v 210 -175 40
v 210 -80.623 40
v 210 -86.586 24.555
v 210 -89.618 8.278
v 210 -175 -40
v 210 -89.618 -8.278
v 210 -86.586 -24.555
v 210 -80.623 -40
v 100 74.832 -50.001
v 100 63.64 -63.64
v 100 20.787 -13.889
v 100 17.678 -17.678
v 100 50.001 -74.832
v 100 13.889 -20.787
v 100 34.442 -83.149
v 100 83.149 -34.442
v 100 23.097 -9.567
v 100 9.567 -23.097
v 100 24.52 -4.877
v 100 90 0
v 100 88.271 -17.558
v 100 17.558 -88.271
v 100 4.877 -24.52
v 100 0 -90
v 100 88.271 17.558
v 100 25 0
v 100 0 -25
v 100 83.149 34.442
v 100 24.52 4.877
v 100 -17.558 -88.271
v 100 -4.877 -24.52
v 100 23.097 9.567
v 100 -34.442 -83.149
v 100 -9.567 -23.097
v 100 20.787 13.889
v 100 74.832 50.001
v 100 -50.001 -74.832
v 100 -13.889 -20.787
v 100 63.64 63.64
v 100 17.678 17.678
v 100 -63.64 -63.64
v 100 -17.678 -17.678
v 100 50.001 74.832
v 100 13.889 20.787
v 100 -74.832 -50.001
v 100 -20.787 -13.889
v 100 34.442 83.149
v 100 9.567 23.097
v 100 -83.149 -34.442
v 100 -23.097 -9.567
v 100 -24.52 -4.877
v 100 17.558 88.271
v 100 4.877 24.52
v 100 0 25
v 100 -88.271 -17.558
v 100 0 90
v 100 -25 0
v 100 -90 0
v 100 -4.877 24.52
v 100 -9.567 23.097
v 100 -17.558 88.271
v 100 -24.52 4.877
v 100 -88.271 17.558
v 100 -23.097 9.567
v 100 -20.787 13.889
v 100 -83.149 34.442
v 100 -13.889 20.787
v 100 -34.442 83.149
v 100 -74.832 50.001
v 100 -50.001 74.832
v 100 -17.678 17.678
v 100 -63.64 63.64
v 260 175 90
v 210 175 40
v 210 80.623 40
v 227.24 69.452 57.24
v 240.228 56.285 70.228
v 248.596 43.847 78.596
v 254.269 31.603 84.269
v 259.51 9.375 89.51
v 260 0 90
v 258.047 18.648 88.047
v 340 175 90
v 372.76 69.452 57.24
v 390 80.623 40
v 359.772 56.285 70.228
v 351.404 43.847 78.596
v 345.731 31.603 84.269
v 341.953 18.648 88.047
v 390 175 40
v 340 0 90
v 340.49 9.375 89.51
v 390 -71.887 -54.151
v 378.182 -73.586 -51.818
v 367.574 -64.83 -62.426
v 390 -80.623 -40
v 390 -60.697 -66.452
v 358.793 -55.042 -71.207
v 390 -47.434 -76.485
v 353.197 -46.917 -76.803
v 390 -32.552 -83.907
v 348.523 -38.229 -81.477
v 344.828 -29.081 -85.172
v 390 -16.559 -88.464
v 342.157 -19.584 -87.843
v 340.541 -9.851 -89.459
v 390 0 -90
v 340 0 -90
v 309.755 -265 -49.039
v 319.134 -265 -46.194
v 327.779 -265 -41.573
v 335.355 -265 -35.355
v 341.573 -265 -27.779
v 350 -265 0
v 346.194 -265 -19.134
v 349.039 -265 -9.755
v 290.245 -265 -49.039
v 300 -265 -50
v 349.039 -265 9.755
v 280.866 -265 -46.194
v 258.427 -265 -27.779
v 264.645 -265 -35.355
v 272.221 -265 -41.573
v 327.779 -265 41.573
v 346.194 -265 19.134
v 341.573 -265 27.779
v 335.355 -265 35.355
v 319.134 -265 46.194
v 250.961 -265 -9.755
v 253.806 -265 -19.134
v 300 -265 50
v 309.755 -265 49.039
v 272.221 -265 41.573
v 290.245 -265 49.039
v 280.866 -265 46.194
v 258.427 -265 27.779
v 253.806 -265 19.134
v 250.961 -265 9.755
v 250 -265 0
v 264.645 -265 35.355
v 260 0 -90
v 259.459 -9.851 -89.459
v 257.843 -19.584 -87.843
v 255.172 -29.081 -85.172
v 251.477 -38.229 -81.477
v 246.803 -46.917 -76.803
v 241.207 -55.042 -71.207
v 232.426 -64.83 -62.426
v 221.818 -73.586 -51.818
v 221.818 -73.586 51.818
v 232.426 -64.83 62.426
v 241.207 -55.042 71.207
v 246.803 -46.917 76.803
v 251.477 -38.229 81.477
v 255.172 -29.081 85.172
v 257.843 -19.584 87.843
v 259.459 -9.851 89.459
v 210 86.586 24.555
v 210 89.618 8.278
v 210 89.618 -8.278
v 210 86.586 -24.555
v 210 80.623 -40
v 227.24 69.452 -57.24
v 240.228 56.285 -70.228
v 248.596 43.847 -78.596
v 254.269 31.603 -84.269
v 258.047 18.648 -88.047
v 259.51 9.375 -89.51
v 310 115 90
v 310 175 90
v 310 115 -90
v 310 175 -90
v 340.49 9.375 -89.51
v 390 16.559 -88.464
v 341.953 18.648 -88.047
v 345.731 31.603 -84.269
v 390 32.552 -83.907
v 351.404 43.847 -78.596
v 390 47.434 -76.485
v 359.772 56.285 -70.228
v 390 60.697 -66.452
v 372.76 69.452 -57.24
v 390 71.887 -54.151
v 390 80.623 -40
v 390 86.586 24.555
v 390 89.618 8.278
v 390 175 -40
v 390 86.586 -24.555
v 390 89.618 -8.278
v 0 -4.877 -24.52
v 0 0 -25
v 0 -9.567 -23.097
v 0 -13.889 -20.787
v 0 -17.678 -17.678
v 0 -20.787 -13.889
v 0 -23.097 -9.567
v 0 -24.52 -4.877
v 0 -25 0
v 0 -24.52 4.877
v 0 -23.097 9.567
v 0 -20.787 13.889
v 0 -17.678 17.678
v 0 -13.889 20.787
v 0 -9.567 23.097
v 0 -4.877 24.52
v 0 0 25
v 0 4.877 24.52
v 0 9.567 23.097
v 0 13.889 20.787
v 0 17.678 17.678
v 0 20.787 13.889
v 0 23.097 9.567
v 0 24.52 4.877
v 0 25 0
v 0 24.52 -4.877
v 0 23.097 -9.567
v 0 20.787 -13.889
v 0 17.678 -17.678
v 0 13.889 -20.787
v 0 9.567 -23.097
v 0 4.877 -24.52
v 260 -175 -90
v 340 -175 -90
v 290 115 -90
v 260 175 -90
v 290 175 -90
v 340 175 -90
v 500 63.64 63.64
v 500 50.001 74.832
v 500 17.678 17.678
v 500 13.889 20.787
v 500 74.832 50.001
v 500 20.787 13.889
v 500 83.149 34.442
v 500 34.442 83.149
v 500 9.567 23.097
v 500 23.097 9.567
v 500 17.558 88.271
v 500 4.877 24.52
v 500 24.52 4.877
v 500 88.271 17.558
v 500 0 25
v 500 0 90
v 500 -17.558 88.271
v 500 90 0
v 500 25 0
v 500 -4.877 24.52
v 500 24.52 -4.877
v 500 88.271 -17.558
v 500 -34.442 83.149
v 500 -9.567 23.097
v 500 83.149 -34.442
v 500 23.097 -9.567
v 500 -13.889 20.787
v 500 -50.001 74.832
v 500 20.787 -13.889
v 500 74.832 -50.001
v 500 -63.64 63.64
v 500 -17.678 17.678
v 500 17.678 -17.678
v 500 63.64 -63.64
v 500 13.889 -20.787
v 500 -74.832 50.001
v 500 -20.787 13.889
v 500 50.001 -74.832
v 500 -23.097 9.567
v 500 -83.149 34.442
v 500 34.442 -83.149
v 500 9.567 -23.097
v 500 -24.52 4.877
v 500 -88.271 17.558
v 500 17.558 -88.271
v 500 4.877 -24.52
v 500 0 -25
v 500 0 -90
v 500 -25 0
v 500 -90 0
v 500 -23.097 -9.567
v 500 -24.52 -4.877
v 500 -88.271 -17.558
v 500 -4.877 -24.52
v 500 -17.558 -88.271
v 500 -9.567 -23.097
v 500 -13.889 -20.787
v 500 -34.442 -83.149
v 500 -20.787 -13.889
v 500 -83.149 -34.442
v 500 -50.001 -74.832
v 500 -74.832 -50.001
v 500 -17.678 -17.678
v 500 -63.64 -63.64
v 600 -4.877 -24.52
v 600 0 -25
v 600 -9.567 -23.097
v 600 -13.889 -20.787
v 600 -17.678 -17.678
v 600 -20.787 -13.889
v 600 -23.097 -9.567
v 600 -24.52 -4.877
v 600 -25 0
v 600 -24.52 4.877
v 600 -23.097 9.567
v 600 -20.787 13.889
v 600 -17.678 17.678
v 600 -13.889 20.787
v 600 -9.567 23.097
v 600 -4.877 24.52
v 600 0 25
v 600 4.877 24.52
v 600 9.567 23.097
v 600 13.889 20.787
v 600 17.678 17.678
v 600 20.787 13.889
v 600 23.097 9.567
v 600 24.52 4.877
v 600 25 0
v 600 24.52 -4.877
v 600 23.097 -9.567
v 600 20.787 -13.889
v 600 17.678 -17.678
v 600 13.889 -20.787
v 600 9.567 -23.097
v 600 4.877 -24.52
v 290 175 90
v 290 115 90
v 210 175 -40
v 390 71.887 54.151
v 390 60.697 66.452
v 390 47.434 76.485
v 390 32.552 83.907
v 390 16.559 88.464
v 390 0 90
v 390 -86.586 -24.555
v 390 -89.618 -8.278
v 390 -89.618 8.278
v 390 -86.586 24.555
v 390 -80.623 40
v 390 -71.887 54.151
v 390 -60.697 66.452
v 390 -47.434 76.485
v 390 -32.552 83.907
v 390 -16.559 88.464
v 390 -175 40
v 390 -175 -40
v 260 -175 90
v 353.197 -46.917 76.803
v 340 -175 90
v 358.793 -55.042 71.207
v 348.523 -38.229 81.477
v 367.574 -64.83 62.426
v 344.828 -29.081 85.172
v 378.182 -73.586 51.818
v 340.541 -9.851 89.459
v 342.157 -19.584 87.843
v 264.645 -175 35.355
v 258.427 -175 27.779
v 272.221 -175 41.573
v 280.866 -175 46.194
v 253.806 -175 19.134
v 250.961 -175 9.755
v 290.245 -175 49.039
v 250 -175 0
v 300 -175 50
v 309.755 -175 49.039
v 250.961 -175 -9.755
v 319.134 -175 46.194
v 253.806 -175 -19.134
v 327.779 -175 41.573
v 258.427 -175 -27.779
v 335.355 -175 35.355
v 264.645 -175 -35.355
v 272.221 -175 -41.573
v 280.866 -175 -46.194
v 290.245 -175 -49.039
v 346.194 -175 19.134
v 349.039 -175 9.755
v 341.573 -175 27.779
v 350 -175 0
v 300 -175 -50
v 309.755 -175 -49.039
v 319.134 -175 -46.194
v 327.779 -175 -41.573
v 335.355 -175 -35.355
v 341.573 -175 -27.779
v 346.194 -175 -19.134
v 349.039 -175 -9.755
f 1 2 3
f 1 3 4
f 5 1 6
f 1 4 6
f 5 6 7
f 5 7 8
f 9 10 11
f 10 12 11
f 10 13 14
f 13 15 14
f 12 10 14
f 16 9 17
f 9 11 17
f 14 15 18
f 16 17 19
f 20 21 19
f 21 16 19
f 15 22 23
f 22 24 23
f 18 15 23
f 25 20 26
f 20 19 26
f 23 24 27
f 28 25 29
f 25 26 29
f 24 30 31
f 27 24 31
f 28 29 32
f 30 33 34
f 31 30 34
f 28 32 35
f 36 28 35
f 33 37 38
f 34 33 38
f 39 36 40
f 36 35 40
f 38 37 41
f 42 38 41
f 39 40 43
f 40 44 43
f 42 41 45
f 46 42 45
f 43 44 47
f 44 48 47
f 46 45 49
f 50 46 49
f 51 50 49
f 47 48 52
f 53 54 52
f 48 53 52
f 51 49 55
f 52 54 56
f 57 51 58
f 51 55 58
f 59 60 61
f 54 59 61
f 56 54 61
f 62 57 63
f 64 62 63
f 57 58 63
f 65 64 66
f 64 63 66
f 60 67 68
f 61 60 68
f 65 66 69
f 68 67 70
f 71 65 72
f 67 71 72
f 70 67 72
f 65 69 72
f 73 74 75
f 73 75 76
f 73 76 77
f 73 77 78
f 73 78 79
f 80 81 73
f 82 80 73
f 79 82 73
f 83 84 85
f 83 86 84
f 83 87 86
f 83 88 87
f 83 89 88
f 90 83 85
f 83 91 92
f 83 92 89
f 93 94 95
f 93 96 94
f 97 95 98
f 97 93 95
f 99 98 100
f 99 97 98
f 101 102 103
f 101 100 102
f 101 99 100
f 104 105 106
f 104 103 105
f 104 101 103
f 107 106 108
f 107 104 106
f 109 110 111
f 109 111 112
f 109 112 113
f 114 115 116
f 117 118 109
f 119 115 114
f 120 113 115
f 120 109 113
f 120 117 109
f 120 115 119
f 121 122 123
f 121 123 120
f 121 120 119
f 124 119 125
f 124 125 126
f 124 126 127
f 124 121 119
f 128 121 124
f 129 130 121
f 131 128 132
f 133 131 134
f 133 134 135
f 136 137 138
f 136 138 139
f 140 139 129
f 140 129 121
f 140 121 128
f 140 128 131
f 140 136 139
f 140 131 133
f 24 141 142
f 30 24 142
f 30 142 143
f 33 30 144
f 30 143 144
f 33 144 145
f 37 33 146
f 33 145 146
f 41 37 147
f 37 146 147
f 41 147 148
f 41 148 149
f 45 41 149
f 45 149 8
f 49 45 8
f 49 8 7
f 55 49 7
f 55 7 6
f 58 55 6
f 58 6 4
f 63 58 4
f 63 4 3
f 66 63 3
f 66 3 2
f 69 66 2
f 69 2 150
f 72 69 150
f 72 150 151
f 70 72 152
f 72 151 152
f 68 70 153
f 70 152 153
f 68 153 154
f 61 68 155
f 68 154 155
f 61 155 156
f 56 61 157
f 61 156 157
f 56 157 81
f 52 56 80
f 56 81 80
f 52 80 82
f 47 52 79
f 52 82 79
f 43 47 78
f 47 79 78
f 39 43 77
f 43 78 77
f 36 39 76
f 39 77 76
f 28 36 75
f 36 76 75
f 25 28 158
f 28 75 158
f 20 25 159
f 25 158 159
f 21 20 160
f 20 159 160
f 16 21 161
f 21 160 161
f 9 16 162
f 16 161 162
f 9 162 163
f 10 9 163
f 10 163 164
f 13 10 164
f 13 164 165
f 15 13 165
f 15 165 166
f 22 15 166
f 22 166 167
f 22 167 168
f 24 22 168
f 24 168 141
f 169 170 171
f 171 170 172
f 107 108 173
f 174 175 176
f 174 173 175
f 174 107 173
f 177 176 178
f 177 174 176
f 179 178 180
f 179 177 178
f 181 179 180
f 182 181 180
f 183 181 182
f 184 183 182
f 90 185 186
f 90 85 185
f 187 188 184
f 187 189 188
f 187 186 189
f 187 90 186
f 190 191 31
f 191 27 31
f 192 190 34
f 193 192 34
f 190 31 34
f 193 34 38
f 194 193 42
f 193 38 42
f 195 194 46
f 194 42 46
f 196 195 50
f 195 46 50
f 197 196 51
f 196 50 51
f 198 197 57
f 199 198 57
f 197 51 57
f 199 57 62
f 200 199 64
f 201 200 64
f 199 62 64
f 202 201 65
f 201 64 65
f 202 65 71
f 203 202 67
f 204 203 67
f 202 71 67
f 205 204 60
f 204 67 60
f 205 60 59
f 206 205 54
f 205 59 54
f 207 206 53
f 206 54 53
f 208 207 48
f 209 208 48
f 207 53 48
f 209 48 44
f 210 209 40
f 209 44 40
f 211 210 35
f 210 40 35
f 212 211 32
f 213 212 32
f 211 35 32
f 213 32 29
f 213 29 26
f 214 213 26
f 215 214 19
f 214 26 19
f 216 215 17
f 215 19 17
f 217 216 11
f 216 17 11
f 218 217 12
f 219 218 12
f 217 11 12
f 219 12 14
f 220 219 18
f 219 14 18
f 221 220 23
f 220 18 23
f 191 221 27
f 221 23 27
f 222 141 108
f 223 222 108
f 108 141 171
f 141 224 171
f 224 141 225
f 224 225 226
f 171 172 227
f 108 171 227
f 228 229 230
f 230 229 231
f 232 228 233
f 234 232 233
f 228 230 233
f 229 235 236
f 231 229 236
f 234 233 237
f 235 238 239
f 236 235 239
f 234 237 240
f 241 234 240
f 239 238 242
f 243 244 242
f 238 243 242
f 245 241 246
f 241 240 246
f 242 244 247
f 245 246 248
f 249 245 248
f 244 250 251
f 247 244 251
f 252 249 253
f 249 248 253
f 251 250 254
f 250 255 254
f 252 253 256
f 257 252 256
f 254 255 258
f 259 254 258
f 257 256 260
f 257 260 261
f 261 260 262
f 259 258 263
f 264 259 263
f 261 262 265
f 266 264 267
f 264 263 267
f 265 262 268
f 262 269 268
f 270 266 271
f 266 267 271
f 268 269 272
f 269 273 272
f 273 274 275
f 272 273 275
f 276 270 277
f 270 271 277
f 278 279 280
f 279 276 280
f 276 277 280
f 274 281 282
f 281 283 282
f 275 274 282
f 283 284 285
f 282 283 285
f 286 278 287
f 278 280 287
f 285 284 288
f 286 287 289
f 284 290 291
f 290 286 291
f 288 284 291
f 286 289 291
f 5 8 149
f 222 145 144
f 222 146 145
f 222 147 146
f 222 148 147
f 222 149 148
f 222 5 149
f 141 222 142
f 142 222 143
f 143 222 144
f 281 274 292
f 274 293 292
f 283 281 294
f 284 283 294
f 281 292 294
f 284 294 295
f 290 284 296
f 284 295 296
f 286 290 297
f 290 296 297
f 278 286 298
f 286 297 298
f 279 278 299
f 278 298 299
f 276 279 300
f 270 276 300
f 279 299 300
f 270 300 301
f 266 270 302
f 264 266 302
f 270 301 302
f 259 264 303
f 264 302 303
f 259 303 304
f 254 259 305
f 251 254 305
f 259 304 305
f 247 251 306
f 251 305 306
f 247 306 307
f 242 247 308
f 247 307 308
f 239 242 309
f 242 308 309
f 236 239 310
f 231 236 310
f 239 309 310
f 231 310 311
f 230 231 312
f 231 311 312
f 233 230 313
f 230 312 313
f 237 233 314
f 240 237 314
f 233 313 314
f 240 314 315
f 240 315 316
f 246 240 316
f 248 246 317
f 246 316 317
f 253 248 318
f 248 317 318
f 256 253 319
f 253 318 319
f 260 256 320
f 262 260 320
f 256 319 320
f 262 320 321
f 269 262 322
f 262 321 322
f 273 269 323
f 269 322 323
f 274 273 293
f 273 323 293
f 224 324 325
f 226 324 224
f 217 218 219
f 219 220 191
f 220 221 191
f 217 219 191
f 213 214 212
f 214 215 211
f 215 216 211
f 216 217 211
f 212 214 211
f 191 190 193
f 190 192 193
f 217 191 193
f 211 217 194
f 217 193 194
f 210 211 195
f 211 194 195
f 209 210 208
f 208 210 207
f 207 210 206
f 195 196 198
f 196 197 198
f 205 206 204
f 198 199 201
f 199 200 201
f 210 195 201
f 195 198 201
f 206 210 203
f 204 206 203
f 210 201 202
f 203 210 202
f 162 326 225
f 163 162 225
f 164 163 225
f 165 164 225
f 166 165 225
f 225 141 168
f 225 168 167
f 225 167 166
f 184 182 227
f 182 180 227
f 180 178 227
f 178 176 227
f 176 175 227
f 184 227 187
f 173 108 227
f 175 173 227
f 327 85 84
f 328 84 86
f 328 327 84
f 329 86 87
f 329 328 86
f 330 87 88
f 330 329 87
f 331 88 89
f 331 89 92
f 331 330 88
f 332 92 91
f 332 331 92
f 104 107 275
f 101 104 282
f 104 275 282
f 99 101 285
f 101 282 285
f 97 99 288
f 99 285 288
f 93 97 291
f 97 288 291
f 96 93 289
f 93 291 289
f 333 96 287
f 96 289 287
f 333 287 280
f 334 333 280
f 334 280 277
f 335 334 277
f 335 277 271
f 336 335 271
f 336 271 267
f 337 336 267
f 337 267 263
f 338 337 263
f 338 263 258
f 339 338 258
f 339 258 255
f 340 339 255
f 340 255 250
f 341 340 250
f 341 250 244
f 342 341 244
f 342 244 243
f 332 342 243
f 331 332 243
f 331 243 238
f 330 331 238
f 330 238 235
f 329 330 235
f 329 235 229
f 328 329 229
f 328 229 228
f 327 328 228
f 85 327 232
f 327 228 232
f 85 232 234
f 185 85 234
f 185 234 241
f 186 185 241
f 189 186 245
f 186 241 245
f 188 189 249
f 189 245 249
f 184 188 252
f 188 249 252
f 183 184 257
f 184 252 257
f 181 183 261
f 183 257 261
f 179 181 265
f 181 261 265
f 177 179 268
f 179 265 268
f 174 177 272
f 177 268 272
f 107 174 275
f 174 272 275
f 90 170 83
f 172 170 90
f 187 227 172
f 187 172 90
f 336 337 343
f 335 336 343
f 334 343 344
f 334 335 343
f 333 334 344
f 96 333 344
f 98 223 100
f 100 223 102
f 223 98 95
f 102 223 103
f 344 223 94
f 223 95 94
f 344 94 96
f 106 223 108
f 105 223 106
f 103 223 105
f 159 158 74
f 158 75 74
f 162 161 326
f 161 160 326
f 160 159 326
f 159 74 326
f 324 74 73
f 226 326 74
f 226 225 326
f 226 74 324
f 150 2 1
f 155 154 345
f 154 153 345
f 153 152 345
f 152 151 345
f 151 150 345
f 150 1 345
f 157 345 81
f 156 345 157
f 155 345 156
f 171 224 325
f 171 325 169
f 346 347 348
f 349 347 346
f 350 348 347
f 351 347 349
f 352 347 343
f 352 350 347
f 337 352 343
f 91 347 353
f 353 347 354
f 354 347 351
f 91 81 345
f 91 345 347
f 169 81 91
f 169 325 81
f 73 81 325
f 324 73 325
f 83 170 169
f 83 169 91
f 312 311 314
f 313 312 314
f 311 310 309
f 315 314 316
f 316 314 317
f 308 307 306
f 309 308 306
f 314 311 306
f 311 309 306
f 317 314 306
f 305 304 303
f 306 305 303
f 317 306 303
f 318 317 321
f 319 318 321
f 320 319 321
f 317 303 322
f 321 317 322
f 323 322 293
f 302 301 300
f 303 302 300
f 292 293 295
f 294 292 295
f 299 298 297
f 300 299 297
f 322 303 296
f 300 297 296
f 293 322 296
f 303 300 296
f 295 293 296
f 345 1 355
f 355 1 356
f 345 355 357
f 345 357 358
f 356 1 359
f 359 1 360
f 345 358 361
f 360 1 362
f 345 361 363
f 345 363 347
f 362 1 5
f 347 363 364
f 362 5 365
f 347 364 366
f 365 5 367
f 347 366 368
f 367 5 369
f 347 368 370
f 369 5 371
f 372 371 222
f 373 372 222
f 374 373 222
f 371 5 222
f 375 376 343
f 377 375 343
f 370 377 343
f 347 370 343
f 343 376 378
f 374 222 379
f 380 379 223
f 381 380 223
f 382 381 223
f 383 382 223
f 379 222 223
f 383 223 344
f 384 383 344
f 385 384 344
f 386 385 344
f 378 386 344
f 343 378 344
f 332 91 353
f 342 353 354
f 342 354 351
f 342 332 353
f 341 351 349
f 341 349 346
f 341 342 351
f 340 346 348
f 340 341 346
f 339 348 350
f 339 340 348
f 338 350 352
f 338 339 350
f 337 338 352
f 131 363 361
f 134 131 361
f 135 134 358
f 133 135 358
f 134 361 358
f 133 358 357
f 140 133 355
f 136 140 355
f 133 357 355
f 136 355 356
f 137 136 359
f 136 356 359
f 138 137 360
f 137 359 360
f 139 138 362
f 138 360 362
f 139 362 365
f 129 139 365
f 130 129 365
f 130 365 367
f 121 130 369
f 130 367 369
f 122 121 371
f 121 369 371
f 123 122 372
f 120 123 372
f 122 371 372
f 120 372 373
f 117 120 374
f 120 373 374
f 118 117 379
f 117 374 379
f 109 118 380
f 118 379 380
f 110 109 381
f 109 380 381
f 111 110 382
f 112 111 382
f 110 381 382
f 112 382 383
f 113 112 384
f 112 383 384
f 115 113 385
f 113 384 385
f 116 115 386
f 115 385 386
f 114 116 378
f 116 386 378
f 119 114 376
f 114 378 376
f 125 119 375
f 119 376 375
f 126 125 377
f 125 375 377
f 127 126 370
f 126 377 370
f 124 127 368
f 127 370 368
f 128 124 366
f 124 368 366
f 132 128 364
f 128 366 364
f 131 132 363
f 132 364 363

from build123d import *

# Parameters (mm, degrees)
SKETCH4_W           = 180
SKETCH4_H           = 180
BOSS_EXTRUDE2_DEPTH = 175
SKETCH5_R           = 50
BOSS_EXTRUDE3_DEPTH = 90
CHAMFER1_SIZE       = 50
SKETCH6_W           = 20
SKETCH6_H           = 180
CUT_EXTRUDE1_DEPTH  = 60


with BuildPart() as part:
    # Sketch3 → Revolve1 (revolve)
    with BuildSketch(Plane.XY, mode=Mode.PRIVATE) as revolve1_sk:
        Polygon((0, 0), (0, 25), (100, 25), (100, 90), (500, 90), (500, 25), (600, 25), (600, 0), align=None)
    revolve(revolve1_sk.sketch.rotate(Axis((0, 0, 0), (-1, 0, 0)), 90), axis=Axis((0, 0, 0), (-1, 0, 0)))

    # Sketch4 → Boss-Extrude2 (add, symmetric)
    with BuildSketch(Plane(origin=(0, 0, 0), x_dir=(1, 0, 0), z_dir=(0, 1, 0))):
        with Locations((300, 0)):
            Rectangle(SKETCH4_W, SKETCH4_H)
    extrude(amount=BOSS_EXTRUDE2_DEPTH, both=True)

    # Sketch5 → Boss-Extrude3 (add)
    with BuildSketch(Plane.XZ.offset(175)):
        with Locations(Location((300, 0, 0), (0, 0, 90))):
            Circle(SKETCH5_R)
    extrude(amount=BOSS_EXTRUDE3_DEPTH)

    # Chamfer1
    # the kernel refuses this chamfer: 50 mm, written as the material it takes off along each edge
    with BuildSketch(Plane(origin=(210, -303.584149398, -90), x_dir=(-0.027495876610586594, 0, 0.9996219169112966), z_dir=(0, 1, 0))) as chamfer1_piece_1_section:
        Polygon((CHAMFER1_SIZE * 0.999621916911, CHAMFER1_SIZE * 0.0274958766106), (-CHAMFER1_SIZE * 0.0274958766106, CHAMFER1_SIZE * 0.999621916911), (0, 0), align=None)
    chamfer1_piece_1 = extrude(amount=303.584149398, mode=Mode.PRIVATE)
    chamfer1_piece_1 = chamfer1_piece_1 - Plane(origin=(227.472268945, 0, 0), x_dir=(0, 0, -1), z_dir=(1, 0, 0)) * Cylinder(90, 808, mode=Mode.PRIVATE)
    add(chamfer1_piece_1, mode=Mode.SUBTRACT)
    with BuildSketch(Plane(origin=(210, -303.584149398, 90), x_dir=(-0.027495876610586598, 0, -0.9996219169112966), z_dir=(0, 1, 0))) as chamfer1_piece_2_section:
        Polygon((CHAMFER1_SIZE * 0.999621916911, -CHAMFER1_SIZE * 0.0274958766106), (-CHAMFER1_SIZE * 0.0274958766106, -CHAMFER1_SIZE * 0.999621916911), (0, 0), align=None)
    chamfer1_piece_2 = extrude(amount=303.584149398, mode=Mode.PRIVATE)
    chamfer1_piece_2 = chamfer1_piece_2 - Plane(origin=(227.472268938, 0, 0), x_dir=(0, 0, -1), z_dir=(1, 0, 0)) * Cylinder(90, 808, mode=Mode.PRIVATE)
    add(chamfer1_piece_2, mode=Mode.SUBTRACT)
    with BuildSketch(Plane(origin=(390, 0, 90), x_dir=(-0.9996219169112966, 0, 0.02749587661058631), z_dir=(0, -1, 0))) as chamfer1_piece_3_section:
        Polygon((CHAMFER1_SIZE * 0.999621916911, CHAMFER1_SIZE * 0.0274958766106), (-CHAMFER1_SIZE * 0.0274958766106, CHAMFER1_SIZE * 0.999621916911), (0, 0), align=None)
    chamfer1_piece_3 = extrude(amount=303.584149398, mode=Mode.PRIVATE)
    chamfer1_piece_3 = chamfer1_piece_3 - Plane(origin=(372.527731062, 0, 0), x_dir=(0, 0, -1), z_dir=(1, 0, 0)) * Cylinder(90, 808, mode=Mode.PRIVATE)
    add(chamfer1_piece_3, mode=Mode.SUBTRACT)
    with BuildSketch(Plane(origin=(390, 303.584149398, -90), x_dir=(-0.9996219169112966, 0, -0.02749587661058631), z_dir=(0, -1, 0))) as chamfer1_piece_4_section:
        Polygon((CHAMFER1_SIZE * 0.999621916911, -CHAMFER1_SIZE * 0.0274958766106), (-CHAMFER1_SIZE * 0.0274958766106, -CHAMFER1_SIZE * 0.999621916911), (0, 0), align=None)
    chamfer1_piece_4 = extrude(amount=303.584149398, mode=Mode.PRIVATE)
    chamfer1_piece_4 = chamfer1_piece_4 - Plane(origin=(372.527731055, 0, 0), x_dir=(0, 0, -1), z_dir=(1, 0, 0)) * Cylinder(90, 808, mode=Mode.PRIVATE)
    add(chamfer1_piece_4, mode=Mode.SUBTRACT)
    with BuildSketch(Plane(origin=(210, 0, -90), x_dir=(-0.027495876610586594, 0, 0.9996219169112966), z_dir=(0, 1, 0))) as chamfer1_piece_5_section:
        Polygon((CHAMFER1_SIZE * 0.999621916911, CHAMFER1_SIZE * 0.0274958766106), (-CHAMFER1_SIZE * 0.0274958766106, CHAMFER1_SIZE * 0.999621916911), (0, 0), align=None)
    chamfer1_piece_5 = extrude(amount=303.584149398, mode=Mode.PRIVATE)
    chamfer1_piece_5 = chamfer1_piece_5 - Plane(origin=(227.472268945, 0, 0), x_dir=(0, 0, -1), z_dir=(1, 0, 0)) * Cylinder(90, 808, mode=Mode.PRIVATE)
    add(chamfer1_piece_5, mode=Mode.SUBTRACT)
    with BuildSketch(Plane(origin=(210, 0, 90), x_dir=(-0.027495876610586598, 0, -0.9996219169112966), z_dir=(0, 1, 0))) as chamfer1_piece_6_section:
        Polygon((CHAMFER1_SIZE * 0.999621916911, -CHAMFER1_SIZE * 0.0274958766106), (-CHAMFER1_SIZE * 0.0274958766106, -CHAMFER1_SIZE * 0.999621916911), (0, 0), align=None)
    chamfer1_piece_6 = extrude(amount=303.584149398, mode=Mode.PRIVATE)
    chamfer1_piece_6 = chamfer1_piece_6 - Plane(origin=(227.472268947, 0, 0), x_dir=(0, 0, -1), z_dir=(1, 0, 0)) * Cylinder(90, 808, mode=Mode.PRIVATE)
    add(chamfer1_piece_6, mode=Mode.SUBTRACT)
    with BuildSketch(Plane(origin=(390, 303.584149398, 90), x_dir=(-0.9996219169112966, 0, 0.02749587661058631), z_dir=(0, -1, 0))) as chamfer1_piece_7_section:
        Polygon((CHAMFER1_SIZE * 0.999621916911, CHAMFER1_SIZE * 0.0274958766106), (-CHAMFER1_SIZE * 0.0274958766106, CHAMFER1_SIZE * 0.999621916911), (0, 0), align=None)
    chamfer1_piece_7 = extrude(amount=303.584149398, mode=Mode.PRIVATE)
    chamfer1_piece_7 = chamfer1_piece_7 - Plane(origin=(372.527731053, 0, 0), x_dir=(0, 0, -1), z_dir=(1, 0, 0)) * Cylinder(90, 808, mode=Mode.PRIVATE)
    add(chamfer1_piece_7, mode=Mode.SUBTRACT)
    with BuildSketch(Plane(origin=(390, 0, -90), x_dir=(-0.9996219169112966, 0, -0.02749587661058631), z_dir=(0, -1, 0))) as chamfer1_piece_8_section:
        Polygon((CHAMFER1_SIZE * 0.999621916911, -CHAMFER1_SIZE * 0.0274958766106), (-CHAMFER1_SIZE * 0.0274958766106, -CHAMFER1_SIZE * 0.999621916911), (0, 0), align=None)
    chamfer1_piece_8 = extrude(amount=303.584149398, mode=Mode.PRIVATE)
    chamfer1_piece_8 = chamfer1_piece_8 - Plane(origin=(372.527731055, 0, 0), x_dir=(0, 0, -1), z_dir=(1, 0, 0)) * Cylinder(90, 808, mode=Mode.PRIVATE)
    add(chamfer1_piece_8, mode=Mode.SUBTRACT)

    # Sketch6 → Cut-Extrude1 (cut)
    with BuildSketch(Plane(origin=(0, 175, 0), x_dir=(1, 0, 0), z_dir=(0, 1, 0))):
        with Locations((300, 0)):
            Rectangle(SKETCH6_W, SKETCH6_H)
    extrude(amount=-CUT_EXTRUDE1_DEPTH, mode=Mode.SUBTRACT)


solid = part.part
